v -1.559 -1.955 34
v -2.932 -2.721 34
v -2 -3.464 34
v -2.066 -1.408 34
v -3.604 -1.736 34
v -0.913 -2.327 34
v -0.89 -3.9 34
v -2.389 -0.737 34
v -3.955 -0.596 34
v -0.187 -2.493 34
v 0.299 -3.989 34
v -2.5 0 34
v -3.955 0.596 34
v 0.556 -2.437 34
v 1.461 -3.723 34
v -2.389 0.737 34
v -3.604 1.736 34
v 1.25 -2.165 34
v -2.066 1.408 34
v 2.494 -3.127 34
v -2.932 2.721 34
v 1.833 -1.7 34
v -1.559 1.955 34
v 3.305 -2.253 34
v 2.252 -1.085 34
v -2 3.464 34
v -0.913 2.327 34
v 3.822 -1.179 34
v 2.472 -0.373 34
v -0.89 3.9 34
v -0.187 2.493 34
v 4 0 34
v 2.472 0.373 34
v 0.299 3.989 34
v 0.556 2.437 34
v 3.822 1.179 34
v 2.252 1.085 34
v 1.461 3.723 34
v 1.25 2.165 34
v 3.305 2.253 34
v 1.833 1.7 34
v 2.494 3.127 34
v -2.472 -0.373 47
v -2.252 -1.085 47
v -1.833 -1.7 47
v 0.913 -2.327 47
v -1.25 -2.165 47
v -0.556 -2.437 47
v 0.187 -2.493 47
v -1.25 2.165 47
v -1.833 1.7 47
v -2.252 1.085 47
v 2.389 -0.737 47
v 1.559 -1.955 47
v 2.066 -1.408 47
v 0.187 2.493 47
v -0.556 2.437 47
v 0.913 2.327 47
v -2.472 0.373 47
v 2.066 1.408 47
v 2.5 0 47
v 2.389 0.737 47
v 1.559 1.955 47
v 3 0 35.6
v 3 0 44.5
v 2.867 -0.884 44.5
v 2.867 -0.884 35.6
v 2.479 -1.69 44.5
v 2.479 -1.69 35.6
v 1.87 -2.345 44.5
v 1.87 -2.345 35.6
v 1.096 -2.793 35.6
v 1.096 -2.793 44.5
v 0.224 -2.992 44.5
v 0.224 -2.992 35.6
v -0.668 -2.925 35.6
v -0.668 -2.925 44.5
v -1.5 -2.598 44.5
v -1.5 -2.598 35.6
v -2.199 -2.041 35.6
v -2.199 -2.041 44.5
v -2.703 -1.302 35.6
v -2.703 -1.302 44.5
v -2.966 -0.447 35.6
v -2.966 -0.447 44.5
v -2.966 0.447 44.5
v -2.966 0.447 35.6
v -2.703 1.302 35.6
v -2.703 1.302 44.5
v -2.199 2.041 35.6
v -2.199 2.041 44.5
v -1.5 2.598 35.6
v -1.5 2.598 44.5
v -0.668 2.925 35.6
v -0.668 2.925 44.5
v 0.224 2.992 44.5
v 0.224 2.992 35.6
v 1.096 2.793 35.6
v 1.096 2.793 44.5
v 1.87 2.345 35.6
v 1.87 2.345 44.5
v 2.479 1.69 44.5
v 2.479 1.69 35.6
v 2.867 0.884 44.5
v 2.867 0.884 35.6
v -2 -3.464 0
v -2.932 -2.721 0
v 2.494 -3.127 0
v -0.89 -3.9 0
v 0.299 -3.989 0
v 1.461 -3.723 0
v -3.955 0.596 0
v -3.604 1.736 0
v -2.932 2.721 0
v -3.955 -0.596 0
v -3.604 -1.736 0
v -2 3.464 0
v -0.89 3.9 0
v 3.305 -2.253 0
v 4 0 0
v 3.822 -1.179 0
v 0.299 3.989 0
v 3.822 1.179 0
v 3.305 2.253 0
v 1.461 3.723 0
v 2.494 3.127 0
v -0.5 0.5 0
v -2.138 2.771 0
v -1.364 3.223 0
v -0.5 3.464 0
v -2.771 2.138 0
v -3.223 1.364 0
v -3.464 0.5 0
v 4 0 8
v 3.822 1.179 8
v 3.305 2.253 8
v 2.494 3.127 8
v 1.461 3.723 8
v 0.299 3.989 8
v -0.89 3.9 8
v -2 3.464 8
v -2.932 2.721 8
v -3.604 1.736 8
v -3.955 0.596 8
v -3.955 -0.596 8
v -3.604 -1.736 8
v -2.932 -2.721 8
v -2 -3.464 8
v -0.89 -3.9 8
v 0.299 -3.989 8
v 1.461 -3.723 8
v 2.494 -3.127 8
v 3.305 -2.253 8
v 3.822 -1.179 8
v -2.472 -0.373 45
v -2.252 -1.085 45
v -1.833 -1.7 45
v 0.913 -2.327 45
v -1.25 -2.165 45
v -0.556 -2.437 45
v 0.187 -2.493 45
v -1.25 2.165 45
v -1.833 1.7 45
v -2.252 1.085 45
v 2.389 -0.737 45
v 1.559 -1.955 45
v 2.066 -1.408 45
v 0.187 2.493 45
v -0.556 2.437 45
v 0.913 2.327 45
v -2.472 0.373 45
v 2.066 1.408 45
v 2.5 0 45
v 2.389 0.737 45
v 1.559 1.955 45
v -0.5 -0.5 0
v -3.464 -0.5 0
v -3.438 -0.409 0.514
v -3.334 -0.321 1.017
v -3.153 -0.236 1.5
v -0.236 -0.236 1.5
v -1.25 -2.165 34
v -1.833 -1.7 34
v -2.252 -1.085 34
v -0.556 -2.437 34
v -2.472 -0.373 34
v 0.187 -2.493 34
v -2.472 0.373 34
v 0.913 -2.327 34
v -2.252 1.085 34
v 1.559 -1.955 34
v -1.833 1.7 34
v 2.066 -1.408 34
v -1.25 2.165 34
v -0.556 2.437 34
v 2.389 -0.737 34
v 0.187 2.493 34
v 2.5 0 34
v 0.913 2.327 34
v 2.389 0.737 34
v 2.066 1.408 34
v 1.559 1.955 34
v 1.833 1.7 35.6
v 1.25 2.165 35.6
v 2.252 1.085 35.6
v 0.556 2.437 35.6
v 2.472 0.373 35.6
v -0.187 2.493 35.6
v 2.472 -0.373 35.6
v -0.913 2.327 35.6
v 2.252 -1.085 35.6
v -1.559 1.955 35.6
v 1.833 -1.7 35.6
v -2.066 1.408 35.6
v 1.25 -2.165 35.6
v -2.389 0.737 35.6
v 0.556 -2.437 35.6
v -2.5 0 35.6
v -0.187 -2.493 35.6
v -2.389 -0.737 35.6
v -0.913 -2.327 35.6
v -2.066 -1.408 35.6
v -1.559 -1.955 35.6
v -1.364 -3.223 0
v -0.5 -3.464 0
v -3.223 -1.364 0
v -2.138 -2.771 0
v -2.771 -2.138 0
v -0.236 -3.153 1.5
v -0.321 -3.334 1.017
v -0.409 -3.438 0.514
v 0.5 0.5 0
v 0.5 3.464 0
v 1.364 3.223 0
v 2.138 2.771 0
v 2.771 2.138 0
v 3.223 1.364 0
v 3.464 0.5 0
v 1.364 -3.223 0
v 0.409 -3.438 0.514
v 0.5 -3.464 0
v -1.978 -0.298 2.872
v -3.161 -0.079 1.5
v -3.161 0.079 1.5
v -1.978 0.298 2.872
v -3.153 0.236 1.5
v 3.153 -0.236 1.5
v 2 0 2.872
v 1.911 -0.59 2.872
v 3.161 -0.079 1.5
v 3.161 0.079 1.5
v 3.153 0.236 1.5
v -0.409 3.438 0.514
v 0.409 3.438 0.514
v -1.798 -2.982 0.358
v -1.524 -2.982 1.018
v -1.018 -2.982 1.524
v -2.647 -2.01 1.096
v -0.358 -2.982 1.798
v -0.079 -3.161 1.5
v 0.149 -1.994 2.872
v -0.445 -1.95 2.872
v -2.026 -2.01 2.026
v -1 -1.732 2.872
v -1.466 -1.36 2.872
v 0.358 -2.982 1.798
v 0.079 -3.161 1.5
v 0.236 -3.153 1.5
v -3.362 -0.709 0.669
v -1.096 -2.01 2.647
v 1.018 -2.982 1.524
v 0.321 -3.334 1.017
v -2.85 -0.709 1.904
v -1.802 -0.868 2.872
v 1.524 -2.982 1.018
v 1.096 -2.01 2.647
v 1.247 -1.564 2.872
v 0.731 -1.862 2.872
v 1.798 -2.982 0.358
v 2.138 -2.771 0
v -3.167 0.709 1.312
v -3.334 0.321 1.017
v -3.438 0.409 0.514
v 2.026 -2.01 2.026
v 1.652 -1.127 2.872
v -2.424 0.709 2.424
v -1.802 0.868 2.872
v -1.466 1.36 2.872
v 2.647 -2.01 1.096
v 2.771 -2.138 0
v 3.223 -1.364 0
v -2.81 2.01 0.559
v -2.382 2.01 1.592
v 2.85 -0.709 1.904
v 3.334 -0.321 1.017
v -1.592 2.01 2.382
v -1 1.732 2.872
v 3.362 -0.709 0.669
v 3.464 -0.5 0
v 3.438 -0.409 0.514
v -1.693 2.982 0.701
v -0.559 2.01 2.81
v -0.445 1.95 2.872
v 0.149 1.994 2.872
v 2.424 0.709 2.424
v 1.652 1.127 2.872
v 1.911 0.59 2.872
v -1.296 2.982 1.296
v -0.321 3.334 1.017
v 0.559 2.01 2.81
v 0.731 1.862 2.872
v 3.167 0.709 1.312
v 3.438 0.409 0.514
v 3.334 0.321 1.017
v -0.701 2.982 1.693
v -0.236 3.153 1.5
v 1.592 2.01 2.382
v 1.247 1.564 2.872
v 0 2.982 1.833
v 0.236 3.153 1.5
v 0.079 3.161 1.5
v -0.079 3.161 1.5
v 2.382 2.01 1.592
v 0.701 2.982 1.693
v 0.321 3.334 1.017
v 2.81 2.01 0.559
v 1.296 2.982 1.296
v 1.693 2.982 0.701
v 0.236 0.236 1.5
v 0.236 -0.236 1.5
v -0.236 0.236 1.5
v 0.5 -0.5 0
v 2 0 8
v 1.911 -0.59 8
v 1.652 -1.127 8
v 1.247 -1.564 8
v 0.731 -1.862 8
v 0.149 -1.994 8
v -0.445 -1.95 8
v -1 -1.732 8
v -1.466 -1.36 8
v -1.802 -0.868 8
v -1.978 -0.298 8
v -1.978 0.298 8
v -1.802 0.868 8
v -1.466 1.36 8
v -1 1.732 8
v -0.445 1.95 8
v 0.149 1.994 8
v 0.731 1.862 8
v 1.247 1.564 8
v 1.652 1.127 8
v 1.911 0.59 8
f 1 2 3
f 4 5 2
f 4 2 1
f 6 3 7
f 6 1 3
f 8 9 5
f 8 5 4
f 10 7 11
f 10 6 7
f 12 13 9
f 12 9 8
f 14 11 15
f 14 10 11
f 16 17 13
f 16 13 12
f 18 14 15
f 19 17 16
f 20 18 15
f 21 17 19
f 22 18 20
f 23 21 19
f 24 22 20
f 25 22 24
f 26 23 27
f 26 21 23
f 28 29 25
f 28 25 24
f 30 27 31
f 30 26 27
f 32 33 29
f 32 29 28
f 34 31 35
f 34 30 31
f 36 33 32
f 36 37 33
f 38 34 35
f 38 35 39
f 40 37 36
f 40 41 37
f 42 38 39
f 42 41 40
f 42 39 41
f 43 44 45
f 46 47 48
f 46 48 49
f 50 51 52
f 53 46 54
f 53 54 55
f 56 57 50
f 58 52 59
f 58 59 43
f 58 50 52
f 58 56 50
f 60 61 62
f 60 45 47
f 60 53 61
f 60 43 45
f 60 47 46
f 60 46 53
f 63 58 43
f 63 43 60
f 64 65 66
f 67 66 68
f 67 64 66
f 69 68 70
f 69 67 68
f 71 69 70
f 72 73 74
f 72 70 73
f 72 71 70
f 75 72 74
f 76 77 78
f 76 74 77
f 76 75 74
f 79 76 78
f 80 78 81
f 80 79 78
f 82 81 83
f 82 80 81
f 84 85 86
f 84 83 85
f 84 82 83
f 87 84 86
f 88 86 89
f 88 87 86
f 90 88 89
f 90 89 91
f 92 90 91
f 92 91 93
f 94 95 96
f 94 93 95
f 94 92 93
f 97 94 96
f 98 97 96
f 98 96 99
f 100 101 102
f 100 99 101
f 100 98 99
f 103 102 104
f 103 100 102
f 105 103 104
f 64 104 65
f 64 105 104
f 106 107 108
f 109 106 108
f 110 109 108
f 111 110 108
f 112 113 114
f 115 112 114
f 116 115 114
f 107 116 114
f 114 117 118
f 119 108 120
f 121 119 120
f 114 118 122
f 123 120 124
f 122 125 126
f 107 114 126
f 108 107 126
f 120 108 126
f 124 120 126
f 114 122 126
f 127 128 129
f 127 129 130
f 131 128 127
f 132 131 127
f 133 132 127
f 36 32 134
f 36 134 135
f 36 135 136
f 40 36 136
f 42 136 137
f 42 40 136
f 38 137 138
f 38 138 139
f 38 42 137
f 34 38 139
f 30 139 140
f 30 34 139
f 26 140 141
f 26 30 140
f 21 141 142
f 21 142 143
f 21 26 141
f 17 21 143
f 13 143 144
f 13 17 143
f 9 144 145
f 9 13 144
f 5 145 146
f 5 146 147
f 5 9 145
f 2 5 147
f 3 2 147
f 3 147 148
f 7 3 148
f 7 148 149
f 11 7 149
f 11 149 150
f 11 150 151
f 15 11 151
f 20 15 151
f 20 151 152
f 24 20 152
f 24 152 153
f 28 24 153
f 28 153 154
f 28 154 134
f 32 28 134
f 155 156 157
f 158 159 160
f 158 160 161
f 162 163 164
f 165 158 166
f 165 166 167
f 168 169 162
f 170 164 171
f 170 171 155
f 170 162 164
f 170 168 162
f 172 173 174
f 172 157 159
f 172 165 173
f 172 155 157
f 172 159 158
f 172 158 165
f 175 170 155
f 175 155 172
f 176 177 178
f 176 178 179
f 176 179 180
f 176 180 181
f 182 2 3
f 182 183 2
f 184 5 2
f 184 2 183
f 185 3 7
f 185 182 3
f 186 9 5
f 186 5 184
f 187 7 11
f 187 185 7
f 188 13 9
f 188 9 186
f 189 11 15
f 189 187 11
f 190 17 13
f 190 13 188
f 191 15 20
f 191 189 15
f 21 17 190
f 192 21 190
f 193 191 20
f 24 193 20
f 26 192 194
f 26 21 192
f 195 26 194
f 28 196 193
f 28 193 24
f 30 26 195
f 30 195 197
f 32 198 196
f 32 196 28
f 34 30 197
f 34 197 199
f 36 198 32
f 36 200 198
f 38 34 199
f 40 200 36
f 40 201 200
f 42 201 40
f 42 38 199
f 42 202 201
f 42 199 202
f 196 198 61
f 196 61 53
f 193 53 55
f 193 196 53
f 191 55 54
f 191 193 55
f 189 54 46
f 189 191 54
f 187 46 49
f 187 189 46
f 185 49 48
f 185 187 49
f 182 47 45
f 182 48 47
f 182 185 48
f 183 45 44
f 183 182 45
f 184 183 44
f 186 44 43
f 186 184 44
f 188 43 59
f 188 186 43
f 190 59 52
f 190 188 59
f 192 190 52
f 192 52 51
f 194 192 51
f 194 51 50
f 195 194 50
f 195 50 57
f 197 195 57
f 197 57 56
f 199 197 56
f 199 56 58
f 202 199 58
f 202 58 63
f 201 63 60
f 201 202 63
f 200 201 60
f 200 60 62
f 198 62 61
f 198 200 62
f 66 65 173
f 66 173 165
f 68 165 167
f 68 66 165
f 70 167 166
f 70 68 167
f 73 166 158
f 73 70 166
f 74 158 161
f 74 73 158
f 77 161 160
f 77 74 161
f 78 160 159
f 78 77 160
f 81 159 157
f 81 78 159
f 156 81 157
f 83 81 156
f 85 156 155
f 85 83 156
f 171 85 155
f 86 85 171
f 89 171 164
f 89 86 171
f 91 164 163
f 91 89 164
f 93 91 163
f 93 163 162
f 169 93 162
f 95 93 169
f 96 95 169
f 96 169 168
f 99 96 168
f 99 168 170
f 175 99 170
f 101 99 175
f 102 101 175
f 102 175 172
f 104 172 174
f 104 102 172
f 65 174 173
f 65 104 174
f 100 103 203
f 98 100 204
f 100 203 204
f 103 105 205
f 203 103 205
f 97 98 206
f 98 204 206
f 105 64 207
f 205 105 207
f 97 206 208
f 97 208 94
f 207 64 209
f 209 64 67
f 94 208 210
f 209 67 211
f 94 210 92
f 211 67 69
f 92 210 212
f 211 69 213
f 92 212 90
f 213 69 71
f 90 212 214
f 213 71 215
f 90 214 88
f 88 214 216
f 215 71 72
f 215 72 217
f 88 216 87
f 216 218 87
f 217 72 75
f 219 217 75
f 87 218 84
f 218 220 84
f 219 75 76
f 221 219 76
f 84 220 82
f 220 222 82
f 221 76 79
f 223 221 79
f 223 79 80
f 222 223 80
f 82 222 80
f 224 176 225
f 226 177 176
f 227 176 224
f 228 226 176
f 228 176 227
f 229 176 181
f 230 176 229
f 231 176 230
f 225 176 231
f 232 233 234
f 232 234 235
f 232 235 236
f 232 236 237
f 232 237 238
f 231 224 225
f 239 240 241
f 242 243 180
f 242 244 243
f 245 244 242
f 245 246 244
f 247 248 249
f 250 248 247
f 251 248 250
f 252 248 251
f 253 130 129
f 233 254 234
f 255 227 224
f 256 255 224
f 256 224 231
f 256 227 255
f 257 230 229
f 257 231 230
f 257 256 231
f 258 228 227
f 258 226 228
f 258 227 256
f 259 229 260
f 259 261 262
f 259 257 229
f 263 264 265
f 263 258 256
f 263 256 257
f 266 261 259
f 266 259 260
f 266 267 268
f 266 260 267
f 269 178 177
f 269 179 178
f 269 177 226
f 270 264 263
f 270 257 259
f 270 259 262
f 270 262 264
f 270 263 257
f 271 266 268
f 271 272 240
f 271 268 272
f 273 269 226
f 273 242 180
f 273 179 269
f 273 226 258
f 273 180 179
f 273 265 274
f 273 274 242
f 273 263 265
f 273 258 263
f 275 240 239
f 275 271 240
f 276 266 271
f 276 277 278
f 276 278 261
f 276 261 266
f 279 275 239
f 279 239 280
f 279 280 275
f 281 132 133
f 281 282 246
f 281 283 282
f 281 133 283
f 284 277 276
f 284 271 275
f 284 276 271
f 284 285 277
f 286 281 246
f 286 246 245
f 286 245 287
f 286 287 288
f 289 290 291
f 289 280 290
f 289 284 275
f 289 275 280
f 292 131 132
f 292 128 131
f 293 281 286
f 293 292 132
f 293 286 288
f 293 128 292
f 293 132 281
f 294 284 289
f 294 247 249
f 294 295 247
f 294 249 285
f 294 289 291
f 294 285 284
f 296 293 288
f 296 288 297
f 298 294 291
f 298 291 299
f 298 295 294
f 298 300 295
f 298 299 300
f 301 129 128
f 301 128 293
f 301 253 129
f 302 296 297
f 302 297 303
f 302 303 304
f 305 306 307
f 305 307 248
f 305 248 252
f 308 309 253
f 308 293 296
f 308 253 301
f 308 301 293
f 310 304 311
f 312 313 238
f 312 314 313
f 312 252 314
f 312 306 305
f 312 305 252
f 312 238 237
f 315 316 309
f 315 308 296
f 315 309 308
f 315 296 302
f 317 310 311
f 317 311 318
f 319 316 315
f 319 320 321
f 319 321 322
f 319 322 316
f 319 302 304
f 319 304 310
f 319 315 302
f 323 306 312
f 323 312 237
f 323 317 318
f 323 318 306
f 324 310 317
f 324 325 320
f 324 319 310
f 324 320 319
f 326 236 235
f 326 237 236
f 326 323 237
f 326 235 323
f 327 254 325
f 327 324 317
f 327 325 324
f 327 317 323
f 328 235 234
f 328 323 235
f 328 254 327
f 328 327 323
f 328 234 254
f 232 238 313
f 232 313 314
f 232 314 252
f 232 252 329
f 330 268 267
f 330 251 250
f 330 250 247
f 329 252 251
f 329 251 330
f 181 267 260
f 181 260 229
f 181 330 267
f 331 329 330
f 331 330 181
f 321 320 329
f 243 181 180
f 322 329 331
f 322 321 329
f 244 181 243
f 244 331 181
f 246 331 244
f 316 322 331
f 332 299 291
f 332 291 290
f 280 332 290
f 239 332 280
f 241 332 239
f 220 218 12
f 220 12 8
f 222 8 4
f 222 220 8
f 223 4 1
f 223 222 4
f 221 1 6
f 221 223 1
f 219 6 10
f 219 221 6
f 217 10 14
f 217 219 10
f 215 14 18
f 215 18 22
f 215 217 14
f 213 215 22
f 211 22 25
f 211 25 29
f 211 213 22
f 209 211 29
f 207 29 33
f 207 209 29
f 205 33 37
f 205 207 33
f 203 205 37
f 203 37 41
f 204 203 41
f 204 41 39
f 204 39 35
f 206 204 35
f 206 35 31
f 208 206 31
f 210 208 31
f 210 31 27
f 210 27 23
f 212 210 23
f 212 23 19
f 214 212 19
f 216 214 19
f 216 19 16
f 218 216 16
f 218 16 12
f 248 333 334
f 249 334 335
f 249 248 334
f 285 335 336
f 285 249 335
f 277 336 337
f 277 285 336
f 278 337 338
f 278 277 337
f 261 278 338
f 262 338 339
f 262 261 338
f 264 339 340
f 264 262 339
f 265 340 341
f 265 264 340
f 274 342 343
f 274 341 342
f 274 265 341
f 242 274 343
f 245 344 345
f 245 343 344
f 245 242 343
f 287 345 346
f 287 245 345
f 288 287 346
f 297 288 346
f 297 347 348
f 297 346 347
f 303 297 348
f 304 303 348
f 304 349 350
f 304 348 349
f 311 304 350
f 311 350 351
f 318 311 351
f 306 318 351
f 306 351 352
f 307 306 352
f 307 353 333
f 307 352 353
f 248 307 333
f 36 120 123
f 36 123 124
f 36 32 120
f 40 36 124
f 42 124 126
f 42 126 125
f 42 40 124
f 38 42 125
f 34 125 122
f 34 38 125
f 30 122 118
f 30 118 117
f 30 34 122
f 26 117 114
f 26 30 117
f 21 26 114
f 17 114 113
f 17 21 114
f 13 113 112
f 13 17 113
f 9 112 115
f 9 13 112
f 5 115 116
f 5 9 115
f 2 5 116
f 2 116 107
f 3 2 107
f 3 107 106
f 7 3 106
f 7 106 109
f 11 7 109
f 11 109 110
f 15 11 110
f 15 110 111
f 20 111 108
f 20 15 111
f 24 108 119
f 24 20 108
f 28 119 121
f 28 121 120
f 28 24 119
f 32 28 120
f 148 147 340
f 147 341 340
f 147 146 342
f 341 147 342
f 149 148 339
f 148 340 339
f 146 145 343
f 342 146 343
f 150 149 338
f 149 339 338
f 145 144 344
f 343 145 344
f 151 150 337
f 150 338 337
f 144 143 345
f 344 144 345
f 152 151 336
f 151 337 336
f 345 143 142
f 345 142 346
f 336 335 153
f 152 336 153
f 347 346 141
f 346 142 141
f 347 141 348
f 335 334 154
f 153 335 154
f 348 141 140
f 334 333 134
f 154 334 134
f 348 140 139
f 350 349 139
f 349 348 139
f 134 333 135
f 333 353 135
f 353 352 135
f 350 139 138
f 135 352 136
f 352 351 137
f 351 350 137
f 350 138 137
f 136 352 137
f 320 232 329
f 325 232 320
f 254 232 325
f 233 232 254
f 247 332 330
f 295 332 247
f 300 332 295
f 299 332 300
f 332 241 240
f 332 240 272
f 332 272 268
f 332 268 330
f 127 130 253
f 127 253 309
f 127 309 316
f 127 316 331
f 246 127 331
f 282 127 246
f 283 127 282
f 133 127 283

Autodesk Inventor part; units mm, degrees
ref_plane "YZ Plane" through (0, 0, 0) normal (1, 0, 0) x (0, 1, 0)
ref_plane "XZ Plane" through (0, 0, 0) normal (0, 1, 0) x (-1, 0, 0)
sketch "Sketch1" plane through (0, 0, 0) normal (0, 0, 1) x (1, 0, 0)
  circle A0 centre (0, 0) radius 2
  dimension "d0" = 4
extrude "Extrusion1" add sketch "Sketch1" along normal blind 34
sketch "Sketch2" plane through (0, 0, 0) normal (0, 0, -1) x (-1, 0, 0)
  circle A0 centre (0, 0) radius 2 projected
  circle A1 centre (0, 0) radius 3.5
  line L0 (0, -3.5) -> (0, 3.5)
  dimension "d3" = 7
revolve "Revolution1" add sketch "Sketch2" angle 360 about axis through (0, -3.5, 0) along (0, 1, 0) picked at (0.41566, 0.521221) picked at (2.954035, -0.407955) contours A0 L0 | A0 L0 A1
split "Split1" plane through (0, 0, 0) removes the side toward (0, 0, -1)
sketch "Sketch3" plane through (0, 0, 34) normal (0, 0, 1) x (1, 0, 0)
  circle A0 centre (0, 0) radius 2 projected
  circle A1 centre (0, 0) radius 4
  dimension "d5" = 8
ref_plane "Work Plane1" through (0, 0, 8) normal (0, 0, -1) x (-1, 0, 0)
extrude "Extrusion2" add sketch "Sketch3" against normal up to surface (26 mm away)
sketch "Sketch4" plane through (0, 0, 34) normal (0, 0, 1) x (1, 0, 0)
  circle A0 centre (0, 0) radius 4 projected
  circle A1 centre (0, 0) radius 3
  dimension "d9" = 6
extrude "Extrusion3" add sketch "Sketch4" along normal blind 11 contours A1
sketch "Sketch5" plane through (0, 0, 0) normal (0, 1, 0) x (-1, 0, 0)
  line L0 (3, 34) -> (3, 45) projected
  line L1 (-3, 34) -> (3, 34) projected
  line L2 (-4, 34) -> (4, 34) projected
  line L3 (0, -7) -> (0, 42) projected
  line L4 (3, 34) -> (2.5, 34)
  line L5 (2.5, 34) -> (2.5, 35.6)
  line L6 (2.5, 35.6) -> (3, 35.6)
  line L7 (3, 35.6) -> (3, 34)
  point P0 (0, 0)
  dimension "d24" = 1.6
  dimension "d25" = 0.5
revolve "Revolution2" cut sketch "Sketch5" angle 360 about axis through (0, 0, -10) along (0, 0, 1)
chamfer "Chamfer1" distance 0.5 angle 45 1 edges at (-3, 0, 45)
thread "Thread1" size "M6x1" class "6g" standard "ISO Metric profile" full length
sketch "Sketch6" plane through (0, 0, 0) normal (0, 0, -1) x (-1, 0, 0)
  circle A0 centre (0, 0) radius 3.5 projected
  line L0 (-0.5, 4) -> (0.5, 4)
  line L1 (0.5, -4) -> (-0.5, -4)
  line L2 (4, 0.5) -> (4, -0.5)
  line L3 (-4, -0.5) -> (-4, 0.5)
  line L4 (-0.5, -4) -> (-0.5, -0.5)
  line L5 (-0.5, 0.5) -> (-0.5, 4)
  line L6 (-4, 0.5) -> (-0.5, 0.5)
  line L7 (0.5, 0.5) -> (4, 0.5)
  line L8 (0.5, 4) -> (0.5, 0.5)
  line L9 (0.5, -0.5) -> (0.5, -4)
  line L10 (4, -0.5) -> (0.5, -0.5)
  line L11 (-0.5, -0.5) -> (-4, -0.5)
  circle A1 centre (0, 0) radius 4 projected
  point P0 (0, 4)
  point P1 (-4, 0)
  dimension "d20" = 1
sketch "Sketch6 outline for Extrusion4" plane through (0, 0, 0) normal (0, 0, -1) x (-1, 0, 0)
  line L0 (-0.5, 4) -> (0.5, 4)
  line L1 (0.5, 4) -> (0.5, 0.5)
  line L2 (0.5, 0.5) -> (4, 0.5)
  line L3 (4, 0.5) -> (4, -0.5)
  line L4 (4, -0.5) -> (0.5, -0.5)
  line L5 (0.5, -0.5) -> (0.5, -4)
  line L6 (0.5, -4) -> (-0.5, -4)
  line L7 (-0.5, -4) -> (-0.5, -0.5)
  line L8 (-0.5, -0.5) -> (-4, -0.5)
  line L9 (-4, -0.5) -> (-4, 0.5)
  line L10 (-4, 0.5) -> (-0.5, 0.5)
  line L11 (-0.5, 0.5) -> (-0.5, 4)
extrude "Extrusion4" cut sketch "Sketch6 outline for Extrusion4" against normal blind 1.5 draft -10
sketch "Sketch7" plane through (0, 0, 34) normal (0, 0, 1) x (1, 0, 0)
  circle A0 centre (0, 0) radius 4
  dimension "d26" = 8
extrude "Extrusion5" add sketch "Sketch7" against normal blind 34 separate body
sketch "Sketch8" plane through (0, 0, 34) normal (0, 0, 1) x (1, 0, 0)
  circle A0 centre (0, 0) radius 2.5
  dimension "d29" = 5
extrude "Extrusion6" add sketch "Sketch8" along normal blind 13 bodies 2
equation "\"d1\" = Bolt_L"
equation "\"d7\" = Bolt_L"
equation "\"d27\" = Bolt_L"
equation "\"Bolt_L\" = 34"
properties part number "Connecting Pin L24" material "Nickel-Copper Alloy 400"
